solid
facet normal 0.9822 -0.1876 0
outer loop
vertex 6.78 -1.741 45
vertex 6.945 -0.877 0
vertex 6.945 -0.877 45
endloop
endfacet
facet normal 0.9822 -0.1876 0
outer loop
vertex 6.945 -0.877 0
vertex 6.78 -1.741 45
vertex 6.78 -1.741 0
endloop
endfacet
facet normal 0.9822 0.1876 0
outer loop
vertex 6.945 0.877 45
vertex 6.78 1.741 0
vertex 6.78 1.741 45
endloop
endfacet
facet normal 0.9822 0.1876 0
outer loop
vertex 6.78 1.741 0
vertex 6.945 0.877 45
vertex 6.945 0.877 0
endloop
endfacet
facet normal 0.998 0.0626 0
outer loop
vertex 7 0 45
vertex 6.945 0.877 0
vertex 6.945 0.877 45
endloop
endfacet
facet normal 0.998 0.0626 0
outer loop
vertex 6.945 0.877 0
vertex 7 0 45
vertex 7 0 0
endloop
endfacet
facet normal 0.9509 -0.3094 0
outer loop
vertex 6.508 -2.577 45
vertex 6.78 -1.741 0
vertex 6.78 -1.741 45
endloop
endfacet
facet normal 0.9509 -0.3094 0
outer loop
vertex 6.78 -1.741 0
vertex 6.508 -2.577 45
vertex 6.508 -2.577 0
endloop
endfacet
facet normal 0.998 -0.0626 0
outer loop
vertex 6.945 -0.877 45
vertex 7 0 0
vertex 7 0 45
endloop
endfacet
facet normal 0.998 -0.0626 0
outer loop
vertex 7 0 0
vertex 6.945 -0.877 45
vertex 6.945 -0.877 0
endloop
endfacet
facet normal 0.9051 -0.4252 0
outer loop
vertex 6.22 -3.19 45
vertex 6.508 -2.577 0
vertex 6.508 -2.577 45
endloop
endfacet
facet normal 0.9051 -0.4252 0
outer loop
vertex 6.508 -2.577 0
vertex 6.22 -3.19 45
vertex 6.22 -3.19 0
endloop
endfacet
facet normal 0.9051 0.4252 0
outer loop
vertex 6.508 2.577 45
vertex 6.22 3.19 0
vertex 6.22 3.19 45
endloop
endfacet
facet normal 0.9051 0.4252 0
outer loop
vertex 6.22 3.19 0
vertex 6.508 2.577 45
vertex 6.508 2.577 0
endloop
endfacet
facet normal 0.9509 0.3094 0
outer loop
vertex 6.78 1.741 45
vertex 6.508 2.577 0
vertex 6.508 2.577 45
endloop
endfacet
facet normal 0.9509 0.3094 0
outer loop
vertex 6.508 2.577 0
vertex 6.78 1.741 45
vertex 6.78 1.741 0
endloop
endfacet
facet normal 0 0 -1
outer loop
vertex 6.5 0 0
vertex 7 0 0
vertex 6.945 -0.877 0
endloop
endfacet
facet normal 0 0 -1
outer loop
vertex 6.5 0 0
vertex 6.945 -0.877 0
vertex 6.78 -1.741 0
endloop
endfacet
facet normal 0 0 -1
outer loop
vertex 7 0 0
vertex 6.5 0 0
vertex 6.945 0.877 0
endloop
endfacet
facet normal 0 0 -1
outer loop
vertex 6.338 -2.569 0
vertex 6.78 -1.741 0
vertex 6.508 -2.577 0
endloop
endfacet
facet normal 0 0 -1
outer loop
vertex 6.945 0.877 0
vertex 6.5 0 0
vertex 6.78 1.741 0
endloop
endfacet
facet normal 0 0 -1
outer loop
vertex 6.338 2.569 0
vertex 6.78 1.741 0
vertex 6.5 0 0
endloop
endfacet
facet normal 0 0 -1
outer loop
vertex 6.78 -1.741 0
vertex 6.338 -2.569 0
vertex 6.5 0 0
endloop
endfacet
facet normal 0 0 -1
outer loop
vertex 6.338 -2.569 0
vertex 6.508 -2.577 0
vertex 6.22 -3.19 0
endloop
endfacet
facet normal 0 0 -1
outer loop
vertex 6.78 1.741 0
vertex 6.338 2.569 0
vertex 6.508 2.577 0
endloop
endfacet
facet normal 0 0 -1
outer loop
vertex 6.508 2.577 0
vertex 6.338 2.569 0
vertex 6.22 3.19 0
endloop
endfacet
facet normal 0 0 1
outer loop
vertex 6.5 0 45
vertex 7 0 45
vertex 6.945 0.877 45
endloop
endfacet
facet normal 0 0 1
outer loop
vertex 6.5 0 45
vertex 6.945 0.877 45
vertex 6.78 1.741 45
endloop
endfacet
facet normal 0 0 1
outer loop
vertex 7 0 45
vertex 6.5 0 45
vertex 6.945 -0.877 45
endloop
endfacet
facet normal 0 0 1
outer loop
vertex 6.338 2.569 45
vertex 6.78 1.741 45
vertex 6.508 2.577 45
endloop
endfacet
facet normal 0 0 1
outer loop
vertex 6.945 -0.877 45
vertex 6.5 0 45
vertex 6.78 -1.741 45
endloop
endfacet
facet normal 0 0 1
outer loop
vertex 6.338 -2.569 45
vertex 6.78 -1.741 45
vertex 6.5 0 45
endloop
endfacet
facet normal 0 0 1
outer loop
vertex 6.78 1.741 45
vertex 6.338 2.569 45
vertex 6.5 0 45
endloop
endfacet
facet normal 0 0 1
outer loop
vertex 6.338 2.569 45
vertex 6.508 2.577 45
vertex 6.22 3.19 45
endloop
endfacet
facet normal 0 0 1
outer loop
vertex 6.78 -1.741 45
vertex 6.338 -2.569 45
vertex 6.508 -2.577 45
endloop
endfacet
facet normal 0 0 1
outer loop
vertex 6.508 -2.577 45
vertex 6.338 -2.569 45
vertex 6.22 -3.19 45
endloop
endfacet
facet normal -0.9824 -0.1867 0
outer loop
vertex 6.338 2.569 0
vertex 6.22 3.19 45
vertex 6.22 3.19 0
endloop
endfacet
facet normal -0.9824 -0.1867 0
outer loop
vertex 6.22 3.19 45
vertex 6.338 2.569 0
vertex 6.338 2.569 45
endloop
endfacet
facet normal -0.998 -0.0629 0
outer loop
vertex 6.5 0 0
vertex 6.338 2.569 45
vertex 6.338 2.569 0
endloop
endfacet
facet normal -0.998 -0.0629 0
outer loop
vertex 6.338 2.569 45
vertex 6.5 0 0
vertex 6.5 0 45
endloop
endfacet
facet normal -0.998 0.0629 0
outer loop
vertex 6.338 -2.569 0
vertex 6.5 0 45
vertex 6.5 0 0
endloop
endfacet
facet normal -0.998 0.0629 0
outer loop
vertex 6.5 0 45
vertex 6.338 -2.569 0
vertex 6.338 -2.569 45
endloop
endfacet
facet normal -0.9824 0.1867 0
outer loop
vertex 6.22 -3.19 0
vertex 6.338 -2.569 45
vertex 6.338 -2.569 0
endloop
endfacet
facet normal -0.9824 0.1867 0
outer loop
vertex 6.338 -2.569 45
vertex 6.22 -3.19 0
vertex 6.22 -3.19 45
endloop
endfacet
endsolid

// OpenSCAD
$fn = 50;


difference() {
	union() {
		cylinder(h = 45, r = 7.0000000000);
		translate(v = [-17.0000000000, 0, 0]) {
			cylinder(h = 45, r = 7.0000000000);
		}
	}
	union() {
		cylinder(h = 45, r = 3.2500000000);
		cylinder(h = 45, r = 1.8000000000);
		cylinder(h = 45, r = 1.8000000000);
		cylinder(h = 45, r = 1.8000000000);
		translate(v = [-21.5000000000, 0, 0]) {
			hull() {
				translate(v = [-3.7500000000, 0.0000000000, 0]) {
					cylinder(h = 45, r = 10.5000000000);
				}
				translate(v = [3.7500000000, 0.0000000000, 0]) {
					cylinder(h = 45, r = 10.5000000000);
				}
				translate(v = [-3.7500000000, -0.0000000000, 0]) {
					cylinder(h = 45, r = 10.5000000000);
				}
				translate(v = [3.7500000000, -0.0000000000, 0]) {
					cylinder(h = 45, r = 10.5000000000);
				}
			}
		}
		translate(v = [-14.0000000000, 0, 0.0000000000]) {
			cylinder(h = 45, r = 20.5000000000);
		}
	}
}
